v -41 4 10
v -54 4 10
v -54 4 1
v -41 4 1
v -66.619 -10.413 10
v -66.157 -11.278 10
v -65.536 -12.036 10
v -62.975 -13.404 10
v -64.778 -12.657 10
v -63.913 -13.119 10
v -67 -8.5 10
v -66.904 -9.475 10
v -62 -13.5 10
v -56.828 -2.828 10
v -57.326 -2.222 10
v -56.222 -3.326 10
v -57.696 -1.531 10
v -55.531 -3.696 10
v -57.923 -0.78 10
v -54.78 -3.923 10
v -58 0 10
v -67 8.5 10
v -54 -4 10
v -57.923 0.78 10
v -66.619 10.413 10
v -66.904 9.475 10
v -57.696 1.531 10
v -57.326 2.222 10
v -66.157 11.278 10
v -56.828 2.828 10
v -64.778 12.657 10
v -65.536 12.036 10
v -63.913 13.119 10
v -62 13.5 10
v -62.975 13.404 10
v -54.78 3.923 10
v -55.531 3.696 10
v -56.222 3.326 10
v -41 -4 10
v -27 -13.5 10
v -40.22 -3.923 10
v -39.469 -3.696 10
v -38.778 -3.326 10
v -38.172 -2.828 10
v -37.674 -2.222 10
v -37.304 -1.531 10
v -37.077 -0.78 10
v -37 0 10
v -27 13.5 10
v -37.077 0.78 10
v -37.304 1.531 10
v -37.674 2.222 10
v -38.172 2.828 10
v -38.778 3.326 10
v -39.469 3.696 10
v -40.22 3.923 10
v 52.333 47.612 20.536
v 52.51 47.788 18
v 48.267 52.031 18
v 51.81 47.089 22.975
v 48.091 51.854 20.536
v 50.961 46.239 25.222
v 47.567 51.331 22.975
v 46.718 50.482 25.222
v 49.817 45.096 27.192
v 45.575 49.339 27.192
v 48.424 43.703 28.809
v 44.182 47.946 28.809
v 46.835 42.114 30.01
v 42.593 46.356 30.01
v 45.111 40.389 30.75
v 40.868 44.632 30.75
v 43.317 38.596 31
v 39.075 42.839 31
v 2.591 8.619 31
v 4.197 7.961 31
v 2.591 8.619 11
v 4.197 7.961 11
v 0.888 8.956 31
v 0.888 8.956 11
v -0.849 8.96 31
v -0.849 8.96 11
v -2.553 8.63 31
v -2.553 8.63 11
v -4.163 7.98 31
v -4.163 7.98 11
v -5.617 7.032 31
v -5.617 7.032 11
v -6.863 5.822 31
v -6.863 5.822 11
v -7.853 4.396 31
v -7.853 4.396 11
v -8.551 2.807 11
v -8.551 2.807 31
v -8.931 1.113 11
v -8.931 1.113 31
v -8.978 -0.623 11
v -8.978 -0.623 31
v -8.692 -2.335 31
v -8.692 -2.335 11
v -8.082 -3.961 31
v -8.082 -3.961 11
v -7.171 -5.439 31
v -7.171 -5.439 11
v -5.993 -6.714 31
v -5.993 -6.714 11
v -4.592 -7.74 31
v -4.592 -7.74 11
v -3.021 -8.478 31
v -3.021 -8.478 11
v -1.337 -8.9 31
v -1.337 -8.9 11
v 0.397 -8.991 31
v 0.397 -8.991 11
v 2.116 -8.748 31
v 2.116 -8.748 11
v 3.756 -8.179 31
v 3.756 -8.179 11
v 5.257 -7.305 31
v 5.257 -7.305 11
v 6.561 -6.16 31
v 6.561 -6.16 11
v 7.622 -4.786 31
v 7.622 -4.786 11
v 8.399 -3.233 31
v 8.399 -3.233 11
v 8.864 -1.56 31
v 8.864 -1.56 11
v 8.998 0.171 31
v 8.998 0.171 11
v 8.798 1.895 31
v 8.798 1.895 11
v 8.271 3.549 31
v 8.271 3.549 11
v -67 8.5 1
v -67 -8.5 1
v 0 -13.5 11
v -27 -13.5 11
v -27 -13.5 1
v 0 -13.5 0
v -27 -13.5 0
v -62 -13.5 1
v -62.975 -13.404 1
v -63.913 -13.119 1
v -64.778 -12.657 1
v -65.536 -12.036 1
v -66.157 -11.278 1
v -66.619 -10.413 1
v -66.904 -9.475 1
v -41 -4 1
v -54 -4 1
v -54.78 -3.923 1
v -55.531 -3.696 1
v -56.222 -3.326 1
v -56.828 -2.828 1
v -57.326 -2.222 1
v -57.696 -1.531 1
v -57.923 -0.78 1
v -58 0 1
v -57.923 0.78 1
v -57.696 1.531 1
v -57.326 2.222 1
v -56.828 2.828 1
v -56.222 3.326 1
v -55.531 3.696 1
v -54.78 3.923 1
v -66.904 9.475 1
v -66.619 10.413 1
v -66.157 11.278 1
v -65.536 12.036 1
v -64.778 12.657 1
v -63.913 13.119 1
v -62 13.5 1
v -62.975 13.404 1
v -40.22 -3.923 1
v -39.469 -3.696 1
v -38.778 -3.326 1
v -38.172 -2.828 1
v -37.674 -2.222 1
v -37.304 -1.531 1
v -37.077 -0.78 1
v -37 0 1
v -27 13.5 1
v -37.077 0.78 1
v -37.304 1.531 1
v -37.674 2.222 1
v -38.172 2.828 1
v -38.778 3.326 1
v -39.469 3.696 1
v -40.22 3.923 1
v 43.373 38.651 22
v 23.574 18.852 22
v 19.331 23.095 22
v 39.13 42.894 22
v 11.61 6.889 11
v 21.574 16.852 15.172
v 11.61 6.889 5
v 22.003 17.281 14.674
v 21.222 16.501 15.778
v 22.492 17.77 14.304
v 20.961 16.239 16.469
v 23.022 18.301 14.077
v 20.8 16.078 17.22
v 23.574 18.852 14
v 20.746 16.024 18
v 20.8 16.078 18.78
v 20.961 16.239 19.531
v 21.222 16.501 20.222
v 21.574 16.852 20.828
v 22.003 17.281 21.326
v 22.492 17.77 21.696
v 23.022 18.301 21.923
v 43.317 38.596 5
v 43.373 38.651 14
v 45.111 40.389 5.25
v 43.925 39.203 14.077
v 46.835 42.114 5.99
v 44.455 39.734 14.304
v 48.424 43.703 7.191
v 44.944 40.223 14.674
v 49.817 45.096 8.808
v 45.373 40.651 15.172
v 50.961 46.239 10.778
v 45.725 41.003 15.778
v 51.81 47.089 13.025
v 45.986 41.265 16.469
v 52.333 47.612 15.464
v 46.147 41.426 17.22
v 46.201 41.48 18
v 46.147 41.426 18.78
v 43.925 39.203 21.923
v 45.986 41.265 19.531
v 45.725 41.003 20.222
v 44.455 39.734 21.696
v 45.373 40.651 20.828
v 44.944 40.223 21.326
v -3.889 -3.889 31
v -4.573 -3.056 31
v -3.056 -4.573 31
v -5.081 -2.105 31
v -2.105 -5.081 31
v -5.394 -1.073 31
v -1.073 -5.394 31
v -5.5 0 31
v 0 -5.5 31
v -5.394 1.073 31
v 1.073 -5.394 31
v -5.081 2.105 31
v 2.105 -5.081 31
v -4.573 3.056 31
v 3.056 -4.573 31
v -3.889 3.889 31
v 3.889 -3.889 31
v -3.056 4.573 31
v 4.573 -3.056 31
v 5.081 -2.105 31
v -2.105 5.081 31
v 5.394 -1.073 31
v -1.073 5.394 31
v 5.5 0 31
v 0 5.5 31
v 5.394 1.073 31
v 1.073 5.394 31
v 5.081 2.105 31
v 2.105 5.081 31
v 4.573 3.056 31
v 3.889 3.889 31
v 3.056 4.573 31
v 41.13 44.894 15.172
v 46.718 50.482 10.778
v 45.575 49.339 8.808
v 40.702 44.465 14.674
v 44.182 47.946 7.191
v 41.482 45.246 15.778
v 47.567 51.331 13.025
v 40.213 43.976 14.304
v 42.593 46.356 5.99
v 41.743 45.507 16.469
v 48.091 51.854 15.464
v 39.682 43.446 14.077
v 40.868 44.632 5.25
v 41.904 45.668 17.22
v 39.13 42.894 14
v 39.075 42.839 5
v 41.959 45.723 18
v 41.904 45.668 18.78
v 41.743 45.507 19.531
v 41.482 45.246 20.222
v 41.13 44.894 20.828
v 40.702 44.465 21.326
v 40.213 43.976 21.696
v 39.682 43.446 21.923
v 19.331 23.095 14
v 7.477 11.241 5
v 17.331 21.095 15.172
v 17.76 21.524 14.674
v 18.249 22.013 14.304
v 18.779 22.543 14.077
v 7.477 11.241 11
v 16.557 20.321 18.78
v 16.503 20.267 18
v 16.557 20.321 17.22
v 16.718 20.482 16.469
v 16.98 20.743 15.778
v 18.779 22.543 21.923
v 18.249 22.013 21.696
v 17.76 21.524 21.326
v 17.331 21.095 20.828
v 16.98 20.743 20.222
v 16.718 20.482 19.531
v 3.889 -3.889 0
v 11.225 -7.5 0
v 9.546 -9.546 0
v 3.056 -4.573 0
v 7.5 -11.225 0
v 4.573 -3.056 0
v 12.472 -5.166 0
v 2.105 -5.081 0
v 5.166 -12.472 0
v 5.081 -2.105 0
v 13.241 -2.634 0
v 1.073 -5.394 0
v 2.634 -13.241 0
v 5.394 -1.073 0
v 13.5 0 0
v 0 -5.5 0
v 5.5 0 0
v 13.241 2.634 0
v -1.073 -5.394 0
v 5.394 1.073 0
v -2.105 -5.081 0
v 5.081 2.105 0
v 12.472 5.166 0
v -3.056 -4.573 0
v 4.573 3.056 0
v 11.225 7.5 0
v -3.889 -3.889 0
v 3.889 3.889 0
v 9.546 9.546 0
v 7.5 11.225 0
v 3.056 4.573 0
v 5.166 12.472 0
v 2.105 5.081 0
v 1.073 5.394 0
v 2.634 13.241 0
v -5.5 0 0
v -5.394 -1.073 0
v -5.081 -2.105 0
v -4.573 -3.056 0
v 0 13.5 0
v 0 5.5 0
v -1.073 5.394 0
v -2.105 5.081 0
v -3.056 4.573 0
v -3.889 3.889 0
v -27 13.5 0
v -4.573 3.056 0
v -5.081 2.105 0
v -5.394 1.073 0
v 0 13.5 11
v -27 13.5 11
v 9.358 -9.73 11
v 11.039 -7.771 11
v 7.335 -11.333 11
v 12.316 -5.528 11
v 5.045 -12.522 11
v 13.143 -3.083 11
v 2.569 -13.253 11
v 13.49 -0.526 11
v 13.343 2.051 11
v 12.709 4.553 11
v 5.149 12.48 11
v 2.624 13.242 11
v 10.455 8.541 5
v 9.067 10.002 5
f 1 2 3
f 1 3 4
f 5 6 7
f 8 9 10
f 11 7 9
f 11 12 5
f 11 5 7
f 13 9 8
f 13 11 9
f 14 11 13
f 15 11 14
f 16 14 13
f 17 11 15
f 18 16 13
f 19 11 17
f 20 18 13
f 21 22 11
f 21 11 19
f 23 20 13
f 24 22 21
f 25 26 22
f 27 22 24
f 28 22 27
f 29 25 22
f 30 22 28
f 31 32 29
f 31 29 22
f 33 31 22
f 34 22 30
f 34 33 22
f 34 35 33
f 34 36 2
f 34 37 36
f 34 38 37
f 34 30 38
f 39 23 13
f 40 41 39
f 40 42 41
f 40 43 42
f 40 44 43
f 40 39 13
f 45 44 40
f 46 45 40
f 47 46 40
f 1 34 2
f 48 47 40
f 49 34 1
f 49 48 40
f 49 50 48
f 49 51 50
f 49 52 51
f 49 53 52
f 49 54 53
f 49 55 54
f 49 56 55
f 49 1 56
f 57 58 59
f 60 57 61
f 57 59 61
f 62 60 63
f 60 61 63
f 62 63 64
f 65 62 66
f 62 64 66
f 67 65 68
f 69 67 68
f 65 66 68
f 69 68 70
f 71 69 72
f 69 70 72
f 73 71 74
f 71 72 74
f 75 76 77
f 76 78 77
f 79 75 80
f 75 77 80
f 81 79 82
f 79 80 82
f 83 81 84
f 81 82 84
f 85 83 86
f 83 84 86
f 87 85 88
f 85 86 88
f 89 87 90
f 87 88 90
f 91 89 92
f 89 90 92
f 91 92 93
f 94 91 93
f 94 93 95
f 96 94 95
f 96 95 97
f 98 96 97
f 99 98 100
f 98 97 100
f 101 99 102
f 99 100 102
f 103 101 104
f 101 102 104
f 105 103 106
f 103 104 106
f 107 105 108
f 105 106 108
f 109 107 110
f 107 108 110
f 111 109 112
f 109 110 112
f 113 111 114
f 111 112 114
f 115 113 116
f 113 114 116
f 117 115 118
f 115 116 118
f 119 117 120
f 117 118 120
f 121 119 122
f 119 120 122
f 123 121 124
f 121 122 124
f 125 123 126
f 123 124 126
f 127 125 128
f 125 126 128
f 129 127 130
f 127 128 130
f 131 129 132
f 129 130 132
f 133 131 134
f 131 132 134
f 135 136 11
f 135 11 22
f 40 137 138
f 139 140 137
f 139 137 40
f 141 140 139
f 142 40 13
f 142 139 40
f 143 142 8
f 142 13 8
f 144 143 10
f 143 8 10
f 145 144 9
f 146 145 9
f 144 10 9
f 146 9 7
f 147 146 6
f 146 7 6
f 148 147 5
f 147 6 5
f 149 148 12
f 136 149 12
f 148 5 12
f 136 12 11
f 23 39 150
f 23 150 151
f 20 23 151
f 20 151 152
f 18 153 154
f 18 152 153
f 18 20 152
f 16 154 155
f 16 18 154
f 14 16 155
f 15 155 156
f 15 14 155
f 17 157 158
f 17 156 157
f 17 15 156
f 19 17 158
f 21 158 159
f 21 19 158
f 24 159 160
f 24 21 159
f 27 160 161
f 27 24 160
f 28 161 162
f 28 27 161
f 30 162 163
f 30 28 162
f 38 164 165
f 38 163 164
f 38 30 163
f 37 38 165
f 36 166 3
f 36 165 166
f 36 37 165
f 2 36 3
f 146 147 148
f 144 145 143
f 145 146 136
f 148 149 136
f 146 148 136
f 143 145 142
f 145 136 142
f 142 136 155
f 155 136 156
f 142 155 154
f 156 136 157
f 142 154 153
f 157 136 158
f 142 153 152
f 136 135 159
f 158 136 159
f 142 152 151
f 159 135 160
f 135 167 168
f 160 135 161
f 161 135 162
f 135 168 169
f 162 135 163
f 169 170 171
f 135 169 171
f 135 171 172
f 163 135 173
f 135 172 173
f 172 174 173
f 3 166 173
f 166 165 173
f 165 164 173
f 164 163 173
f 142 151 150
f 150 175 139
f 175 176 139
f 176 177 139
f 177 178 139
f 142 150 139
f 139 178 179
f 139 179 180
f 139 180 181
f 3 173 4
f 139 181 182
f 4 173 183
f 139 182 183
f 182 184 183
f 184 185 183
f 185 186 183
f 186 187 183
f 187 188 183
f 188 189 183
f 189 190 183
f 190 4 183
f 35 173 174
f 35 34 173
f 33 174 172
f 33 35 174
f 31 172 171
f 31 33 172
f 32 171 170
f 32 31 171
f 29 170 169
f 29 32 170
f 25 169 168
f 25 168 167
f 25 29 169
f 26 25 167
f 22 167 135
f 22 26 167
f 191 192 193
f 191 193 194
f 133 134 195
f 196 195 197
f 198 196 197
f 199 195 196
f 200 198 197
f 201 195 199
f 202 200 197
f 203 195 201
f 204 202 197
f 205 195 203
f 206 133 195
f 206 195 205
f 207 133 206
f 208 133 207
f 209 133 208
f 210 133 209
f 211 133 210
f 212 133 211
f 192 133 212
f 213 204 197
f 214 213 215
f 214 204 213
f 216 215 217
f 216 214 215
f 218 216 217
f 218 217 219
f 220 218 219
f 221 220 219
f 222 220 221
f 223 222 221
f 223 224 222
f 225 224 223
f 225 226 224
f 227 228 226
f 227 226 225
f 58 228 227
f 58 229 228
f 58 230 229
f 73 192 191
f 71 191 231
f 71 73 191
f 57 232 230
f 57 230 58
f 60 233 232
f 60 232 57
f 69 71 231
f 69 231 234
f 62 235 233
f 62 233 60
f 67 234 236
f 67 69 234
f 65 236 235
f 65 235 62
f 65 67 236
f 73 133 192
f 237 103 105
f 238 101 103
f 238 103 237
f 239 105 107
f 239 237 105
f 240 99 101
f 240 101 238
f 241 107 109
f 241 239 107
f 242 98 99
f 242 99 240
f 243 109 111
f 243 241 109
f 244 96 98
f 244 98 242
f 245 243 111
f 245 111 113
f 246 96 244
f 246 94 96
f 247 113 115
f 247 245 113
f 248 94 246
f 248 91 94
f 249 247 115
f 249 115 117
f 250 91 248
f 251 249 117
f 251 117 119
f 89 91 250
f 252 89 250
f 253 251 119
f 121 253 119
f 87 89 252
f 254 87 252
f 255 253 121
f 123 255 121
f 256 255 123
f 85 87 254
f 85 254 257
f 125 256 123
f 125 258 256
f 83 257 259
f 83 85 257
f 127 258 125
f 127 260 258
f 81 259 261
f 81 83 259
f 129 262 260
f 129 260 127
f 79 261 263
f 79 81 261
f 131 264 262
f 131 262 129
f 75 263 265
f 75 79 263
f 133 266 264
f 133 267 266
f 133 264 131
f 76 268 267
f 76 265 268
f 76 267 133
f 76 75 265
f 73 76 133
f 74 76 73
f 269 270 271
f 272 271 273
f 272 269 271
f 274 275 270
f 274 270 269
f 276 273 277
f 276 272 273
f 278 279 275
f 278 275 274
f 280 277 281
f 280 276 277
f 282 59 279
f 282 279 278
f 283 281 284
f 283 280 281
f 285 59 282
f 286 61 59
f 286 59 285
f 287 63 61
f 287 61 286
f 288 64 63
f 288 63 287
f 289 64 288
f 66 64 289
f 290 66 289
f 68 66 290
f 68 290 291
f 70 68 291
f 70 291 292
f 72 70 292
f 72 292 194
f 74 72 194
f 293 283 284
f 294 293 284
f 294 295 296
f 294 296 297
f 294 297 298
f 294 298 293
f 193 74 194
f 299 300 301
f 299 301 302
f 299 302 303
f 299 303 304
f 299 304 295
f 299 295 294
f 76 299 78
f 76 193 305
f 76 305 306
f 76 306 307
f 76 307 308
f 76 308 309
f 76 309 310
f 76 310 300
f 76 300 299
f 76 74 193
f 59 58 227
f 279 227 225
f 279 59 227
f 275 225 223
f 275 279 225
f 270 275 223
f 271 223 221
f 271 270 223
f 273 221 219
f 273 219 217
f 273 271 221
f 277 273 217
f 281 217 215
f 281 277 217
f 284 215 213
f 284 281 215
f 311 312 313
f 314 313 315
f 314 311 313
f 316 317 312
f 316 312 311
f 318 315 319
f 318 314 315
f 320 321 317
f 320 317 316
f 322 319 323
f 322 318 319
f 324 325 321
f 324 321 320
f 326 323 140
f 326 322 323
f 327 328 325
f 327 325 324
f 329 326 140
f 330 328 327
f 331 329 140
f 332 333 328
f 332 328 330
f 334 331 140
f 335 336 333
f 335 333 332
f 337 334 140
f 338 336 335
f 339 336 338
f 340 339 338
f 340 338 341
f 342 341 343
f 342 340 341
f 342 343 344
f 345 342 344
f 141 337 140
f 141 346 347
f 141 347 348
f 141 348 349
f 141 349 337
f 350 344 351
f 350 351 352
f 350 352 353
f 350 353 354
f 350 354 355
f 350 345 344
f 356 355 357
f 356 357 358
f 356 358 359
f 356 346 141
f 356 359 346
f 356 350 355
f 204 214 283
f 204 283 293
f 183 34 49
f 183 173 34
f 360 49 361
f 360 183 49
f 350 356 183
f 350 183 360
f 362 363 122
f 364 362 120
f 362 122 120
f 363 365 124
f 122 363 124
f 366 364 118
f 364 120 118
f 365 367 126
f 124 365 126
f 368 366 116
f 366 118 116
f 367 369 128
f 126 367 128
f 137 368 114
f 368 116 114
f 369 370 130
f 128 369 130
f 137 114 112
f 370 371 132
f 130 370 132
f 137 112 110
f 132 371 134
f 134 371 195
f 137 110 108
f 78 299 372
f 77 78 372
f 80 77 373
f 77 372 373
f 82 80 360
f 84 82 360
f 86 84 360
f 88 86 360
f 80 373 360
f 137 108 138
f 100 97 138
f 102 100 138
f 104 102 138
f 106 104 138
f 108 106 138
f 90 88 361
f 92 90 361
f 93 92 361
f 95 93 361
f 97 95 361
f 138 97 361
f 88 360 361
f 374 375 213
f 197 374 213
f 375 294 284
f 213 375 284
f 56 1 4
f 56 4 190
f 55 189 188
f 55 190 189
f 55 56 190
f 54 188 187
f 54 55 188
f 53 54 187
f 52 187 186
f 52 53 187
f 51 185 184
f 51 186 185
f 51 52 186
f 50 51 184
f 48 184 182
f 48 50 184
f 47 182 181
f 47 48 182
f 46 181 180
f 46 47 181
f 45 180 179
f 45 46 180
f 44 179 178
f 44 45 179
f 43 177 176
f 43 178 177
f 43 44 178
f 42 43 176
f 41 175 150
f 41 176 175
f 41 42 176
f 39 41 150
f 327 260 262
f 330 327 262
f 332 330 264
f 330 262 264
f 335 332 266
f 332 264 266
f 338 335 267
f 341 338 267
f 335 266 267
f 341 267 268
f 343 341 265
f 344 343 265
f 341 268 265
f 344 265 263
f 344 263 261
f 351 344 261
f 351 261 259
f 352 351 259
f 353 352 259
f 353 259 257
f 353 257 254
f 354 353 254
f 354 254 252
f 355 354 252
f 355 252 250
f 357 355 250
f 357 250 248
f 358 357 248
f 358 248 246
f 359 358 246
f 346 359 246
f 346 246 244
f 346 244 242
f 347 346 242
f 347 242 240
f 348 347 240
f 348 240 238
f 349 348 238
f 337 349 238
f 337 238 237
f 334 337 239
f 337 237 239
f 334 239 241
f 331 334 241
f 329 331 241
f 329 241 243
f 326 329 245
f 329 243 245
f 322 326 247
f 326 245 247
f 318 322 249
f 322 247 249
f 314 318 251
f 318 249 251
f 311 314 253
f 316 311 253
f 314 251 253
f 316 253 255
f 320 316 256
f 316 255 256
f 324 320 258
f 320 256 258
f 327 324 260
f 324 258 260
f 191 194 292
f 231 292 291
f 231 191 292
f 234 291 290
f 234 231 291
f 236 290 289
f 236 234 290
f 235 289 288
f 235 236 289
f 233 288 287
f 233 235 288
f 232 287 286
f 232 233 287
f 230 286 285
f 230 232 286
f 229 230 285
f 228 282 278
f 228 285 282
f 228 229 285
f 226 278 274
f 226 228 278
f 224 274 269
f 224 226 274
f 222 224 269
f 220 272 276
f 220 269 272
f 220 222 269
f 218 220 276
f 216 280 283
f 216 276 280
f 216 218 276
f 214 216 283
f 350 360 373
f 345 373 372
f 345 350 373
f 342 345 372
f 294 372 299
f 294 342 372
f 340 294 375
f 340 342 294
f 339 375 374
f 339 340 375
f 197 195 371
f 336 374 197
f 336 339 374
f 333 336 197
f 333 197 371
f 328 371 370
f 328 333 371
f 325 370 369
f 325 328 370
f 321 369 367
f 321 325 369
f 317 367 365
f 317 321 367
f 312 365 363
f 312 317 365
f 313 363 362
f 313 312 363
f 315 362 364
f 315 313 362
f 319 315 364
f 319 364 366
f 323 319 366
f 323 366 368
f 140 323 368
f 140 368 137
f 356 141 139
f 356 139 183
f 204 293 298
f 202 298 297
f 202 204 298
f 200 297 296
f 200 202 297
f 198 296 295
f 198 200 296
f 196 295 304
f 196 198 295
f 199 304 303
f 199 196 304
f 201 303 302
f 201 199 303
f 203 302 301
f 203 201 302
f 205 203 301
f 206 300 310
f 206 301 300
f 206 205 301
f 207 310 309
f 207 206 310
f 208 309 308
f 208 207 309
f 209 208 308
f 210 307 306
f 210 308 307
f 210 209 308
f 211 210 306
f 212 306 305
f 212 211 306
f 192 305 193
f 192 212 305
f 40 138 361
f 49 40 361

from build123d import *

# Parameters (mm, degrees)
EXTRUDE_1_DEPTH     = 11
CUT_EXTRUDE_1_DEPTH = 15
SKETCH_3_R          = 9
EXTRUDE_2_DEPTH     = 20
SKETCH_4_W          = 40
SKETCH_4_H          = 27
CUT_EXTRUDE_2_DEPTH = 1
SKETCH_6_R          = 5.5
CUT_EXTRUDE_3_DEPTH = 76.048317769
EXTRUDE_3_DEPTH     = 26
FILLET_1_R          = 13
FILLET_2_R          = 5
CUT_EXTRUDE_4_DEPTH = 10


with BuildPart() as part:
    # 스케치1 → 보스-돌출1 (new body)
    with BuildSketch(Plane.XY):
        with BuildLine():
            Line((-67, 13.5), (0, 13.5))
            ThreePointArc((0, 13.5), (13.5, 0), (0, -13.5))
            Line((0, -13.5), (-67, -13.5))
            Line((-67, -13.5), (-67, 13.5))
        make_face()
    extrude(amount=EXTRUDE_1_DEPTH)

    # 스케치2 → 컷-돌출1 (cut)
    with BuildSketch(Plane.XY.offset(11)):
        with BuildLine():
            Line((-54, 4), (-41, 4))
            ThreePointArc((-41, 4), (-37, 0), (-41, -4))
            Line((-41, -4), (-54, -4))
            ThreePointArc((-54, -4), (-58, 0), (-54, 4))
        make_face()
    extrude(amount=-CUT_EXTRUDE_1_DEPTH, mode=Mode.SUBTRACT)

    # 스케치3 → 보스-돌출2 (add)
    with BuildSketch(Plane.XY.offset(11)):
        Circle(SKETCH_3_R)
    extrude(amount=EXTRUDE_2_DEPTH)

    # 스케치4 → 컷-돌출2 (cut)
    with BuildSketch(Plane.XY.offset(11)):
        with Locations((-47, 0)):
            Rectangle(SKETCH_4_W, SKETCH_4_H)
    cut_extrude_2 = extrude(amount=-CUT_EXTRUDE_2_DEPTH, mode=Mode.SUBTRACT)

    # 대칭 복사1: 컷-돌출2 across plane
    add(cut_extrude_2.mirror(Plane.XY.offset(5.5)), mode=Mode.SUBTRACT)

    # 스케치6 → 컷-돌출3 (cut, through all)
    with BuildSketch(Plane.XY.offset(31)):
        Circle(SKETCH_6_R)
    extrude(amount=-CUT_EXTRUDE_3_DEPTH, mode=Mode.SUBTRACT)

    # 스케치8 → 보스-돌출3 (add)
    with BuildSketch(Plane.XY.offset(31)):
        Polygon((48.267141866, 52.030952398), (3.01230787, 6.776118402), (7.254948557, 2.533477715), (52.509782553, 47.788311711), align=None)
    extrude(amount=-EXTRUDE_3_DEPTH)

    # 필렛1
    fillet_1_edges = [part.edges().sort_by_distance(p)[0] for p in [
        (50.38846221, 49.909632055, 31),
        (50.38846221, 49.909632055, 5),
    ]]
    fillet(fillet_1_edges, radius=FILLET_1_R - 0.0001)  # a hair under: the kernel refuses the full size

    # 필렛2
    fillet_2_edges = [part.edges().sort_by_distance(p)[0] for p in [
        (-67, -13.5, 5.5),
        (-67, 13.5, 5.5),
    ]]
    fillet(fillet_2_edges, radius=FILLET_2_R)

    # 스케치11 → 컷-돌출4 (cut)
    with BuildSketch(Plane(origin=(2.360735421, -2.360735421, 0), x_dir=(0, 0, -1), z_dir=(0.7071067811865477, -0.7071067811865475, 0))):
        with BuildLine():
            Line((-14, 58), (-14, 30))
            ThreePointArc((-14, 30), (-18, 26), (-22, 30))
            Line((-22, 30), (-22, 58))
            ThreePointArc((-22, 58), (-18, 62), (-14, 58))
        make_face()
    extrude(amount=-CUT_EXTRUDE_4_DEPTH, mode=Mode.SUBTRACT)


solid = part.part
